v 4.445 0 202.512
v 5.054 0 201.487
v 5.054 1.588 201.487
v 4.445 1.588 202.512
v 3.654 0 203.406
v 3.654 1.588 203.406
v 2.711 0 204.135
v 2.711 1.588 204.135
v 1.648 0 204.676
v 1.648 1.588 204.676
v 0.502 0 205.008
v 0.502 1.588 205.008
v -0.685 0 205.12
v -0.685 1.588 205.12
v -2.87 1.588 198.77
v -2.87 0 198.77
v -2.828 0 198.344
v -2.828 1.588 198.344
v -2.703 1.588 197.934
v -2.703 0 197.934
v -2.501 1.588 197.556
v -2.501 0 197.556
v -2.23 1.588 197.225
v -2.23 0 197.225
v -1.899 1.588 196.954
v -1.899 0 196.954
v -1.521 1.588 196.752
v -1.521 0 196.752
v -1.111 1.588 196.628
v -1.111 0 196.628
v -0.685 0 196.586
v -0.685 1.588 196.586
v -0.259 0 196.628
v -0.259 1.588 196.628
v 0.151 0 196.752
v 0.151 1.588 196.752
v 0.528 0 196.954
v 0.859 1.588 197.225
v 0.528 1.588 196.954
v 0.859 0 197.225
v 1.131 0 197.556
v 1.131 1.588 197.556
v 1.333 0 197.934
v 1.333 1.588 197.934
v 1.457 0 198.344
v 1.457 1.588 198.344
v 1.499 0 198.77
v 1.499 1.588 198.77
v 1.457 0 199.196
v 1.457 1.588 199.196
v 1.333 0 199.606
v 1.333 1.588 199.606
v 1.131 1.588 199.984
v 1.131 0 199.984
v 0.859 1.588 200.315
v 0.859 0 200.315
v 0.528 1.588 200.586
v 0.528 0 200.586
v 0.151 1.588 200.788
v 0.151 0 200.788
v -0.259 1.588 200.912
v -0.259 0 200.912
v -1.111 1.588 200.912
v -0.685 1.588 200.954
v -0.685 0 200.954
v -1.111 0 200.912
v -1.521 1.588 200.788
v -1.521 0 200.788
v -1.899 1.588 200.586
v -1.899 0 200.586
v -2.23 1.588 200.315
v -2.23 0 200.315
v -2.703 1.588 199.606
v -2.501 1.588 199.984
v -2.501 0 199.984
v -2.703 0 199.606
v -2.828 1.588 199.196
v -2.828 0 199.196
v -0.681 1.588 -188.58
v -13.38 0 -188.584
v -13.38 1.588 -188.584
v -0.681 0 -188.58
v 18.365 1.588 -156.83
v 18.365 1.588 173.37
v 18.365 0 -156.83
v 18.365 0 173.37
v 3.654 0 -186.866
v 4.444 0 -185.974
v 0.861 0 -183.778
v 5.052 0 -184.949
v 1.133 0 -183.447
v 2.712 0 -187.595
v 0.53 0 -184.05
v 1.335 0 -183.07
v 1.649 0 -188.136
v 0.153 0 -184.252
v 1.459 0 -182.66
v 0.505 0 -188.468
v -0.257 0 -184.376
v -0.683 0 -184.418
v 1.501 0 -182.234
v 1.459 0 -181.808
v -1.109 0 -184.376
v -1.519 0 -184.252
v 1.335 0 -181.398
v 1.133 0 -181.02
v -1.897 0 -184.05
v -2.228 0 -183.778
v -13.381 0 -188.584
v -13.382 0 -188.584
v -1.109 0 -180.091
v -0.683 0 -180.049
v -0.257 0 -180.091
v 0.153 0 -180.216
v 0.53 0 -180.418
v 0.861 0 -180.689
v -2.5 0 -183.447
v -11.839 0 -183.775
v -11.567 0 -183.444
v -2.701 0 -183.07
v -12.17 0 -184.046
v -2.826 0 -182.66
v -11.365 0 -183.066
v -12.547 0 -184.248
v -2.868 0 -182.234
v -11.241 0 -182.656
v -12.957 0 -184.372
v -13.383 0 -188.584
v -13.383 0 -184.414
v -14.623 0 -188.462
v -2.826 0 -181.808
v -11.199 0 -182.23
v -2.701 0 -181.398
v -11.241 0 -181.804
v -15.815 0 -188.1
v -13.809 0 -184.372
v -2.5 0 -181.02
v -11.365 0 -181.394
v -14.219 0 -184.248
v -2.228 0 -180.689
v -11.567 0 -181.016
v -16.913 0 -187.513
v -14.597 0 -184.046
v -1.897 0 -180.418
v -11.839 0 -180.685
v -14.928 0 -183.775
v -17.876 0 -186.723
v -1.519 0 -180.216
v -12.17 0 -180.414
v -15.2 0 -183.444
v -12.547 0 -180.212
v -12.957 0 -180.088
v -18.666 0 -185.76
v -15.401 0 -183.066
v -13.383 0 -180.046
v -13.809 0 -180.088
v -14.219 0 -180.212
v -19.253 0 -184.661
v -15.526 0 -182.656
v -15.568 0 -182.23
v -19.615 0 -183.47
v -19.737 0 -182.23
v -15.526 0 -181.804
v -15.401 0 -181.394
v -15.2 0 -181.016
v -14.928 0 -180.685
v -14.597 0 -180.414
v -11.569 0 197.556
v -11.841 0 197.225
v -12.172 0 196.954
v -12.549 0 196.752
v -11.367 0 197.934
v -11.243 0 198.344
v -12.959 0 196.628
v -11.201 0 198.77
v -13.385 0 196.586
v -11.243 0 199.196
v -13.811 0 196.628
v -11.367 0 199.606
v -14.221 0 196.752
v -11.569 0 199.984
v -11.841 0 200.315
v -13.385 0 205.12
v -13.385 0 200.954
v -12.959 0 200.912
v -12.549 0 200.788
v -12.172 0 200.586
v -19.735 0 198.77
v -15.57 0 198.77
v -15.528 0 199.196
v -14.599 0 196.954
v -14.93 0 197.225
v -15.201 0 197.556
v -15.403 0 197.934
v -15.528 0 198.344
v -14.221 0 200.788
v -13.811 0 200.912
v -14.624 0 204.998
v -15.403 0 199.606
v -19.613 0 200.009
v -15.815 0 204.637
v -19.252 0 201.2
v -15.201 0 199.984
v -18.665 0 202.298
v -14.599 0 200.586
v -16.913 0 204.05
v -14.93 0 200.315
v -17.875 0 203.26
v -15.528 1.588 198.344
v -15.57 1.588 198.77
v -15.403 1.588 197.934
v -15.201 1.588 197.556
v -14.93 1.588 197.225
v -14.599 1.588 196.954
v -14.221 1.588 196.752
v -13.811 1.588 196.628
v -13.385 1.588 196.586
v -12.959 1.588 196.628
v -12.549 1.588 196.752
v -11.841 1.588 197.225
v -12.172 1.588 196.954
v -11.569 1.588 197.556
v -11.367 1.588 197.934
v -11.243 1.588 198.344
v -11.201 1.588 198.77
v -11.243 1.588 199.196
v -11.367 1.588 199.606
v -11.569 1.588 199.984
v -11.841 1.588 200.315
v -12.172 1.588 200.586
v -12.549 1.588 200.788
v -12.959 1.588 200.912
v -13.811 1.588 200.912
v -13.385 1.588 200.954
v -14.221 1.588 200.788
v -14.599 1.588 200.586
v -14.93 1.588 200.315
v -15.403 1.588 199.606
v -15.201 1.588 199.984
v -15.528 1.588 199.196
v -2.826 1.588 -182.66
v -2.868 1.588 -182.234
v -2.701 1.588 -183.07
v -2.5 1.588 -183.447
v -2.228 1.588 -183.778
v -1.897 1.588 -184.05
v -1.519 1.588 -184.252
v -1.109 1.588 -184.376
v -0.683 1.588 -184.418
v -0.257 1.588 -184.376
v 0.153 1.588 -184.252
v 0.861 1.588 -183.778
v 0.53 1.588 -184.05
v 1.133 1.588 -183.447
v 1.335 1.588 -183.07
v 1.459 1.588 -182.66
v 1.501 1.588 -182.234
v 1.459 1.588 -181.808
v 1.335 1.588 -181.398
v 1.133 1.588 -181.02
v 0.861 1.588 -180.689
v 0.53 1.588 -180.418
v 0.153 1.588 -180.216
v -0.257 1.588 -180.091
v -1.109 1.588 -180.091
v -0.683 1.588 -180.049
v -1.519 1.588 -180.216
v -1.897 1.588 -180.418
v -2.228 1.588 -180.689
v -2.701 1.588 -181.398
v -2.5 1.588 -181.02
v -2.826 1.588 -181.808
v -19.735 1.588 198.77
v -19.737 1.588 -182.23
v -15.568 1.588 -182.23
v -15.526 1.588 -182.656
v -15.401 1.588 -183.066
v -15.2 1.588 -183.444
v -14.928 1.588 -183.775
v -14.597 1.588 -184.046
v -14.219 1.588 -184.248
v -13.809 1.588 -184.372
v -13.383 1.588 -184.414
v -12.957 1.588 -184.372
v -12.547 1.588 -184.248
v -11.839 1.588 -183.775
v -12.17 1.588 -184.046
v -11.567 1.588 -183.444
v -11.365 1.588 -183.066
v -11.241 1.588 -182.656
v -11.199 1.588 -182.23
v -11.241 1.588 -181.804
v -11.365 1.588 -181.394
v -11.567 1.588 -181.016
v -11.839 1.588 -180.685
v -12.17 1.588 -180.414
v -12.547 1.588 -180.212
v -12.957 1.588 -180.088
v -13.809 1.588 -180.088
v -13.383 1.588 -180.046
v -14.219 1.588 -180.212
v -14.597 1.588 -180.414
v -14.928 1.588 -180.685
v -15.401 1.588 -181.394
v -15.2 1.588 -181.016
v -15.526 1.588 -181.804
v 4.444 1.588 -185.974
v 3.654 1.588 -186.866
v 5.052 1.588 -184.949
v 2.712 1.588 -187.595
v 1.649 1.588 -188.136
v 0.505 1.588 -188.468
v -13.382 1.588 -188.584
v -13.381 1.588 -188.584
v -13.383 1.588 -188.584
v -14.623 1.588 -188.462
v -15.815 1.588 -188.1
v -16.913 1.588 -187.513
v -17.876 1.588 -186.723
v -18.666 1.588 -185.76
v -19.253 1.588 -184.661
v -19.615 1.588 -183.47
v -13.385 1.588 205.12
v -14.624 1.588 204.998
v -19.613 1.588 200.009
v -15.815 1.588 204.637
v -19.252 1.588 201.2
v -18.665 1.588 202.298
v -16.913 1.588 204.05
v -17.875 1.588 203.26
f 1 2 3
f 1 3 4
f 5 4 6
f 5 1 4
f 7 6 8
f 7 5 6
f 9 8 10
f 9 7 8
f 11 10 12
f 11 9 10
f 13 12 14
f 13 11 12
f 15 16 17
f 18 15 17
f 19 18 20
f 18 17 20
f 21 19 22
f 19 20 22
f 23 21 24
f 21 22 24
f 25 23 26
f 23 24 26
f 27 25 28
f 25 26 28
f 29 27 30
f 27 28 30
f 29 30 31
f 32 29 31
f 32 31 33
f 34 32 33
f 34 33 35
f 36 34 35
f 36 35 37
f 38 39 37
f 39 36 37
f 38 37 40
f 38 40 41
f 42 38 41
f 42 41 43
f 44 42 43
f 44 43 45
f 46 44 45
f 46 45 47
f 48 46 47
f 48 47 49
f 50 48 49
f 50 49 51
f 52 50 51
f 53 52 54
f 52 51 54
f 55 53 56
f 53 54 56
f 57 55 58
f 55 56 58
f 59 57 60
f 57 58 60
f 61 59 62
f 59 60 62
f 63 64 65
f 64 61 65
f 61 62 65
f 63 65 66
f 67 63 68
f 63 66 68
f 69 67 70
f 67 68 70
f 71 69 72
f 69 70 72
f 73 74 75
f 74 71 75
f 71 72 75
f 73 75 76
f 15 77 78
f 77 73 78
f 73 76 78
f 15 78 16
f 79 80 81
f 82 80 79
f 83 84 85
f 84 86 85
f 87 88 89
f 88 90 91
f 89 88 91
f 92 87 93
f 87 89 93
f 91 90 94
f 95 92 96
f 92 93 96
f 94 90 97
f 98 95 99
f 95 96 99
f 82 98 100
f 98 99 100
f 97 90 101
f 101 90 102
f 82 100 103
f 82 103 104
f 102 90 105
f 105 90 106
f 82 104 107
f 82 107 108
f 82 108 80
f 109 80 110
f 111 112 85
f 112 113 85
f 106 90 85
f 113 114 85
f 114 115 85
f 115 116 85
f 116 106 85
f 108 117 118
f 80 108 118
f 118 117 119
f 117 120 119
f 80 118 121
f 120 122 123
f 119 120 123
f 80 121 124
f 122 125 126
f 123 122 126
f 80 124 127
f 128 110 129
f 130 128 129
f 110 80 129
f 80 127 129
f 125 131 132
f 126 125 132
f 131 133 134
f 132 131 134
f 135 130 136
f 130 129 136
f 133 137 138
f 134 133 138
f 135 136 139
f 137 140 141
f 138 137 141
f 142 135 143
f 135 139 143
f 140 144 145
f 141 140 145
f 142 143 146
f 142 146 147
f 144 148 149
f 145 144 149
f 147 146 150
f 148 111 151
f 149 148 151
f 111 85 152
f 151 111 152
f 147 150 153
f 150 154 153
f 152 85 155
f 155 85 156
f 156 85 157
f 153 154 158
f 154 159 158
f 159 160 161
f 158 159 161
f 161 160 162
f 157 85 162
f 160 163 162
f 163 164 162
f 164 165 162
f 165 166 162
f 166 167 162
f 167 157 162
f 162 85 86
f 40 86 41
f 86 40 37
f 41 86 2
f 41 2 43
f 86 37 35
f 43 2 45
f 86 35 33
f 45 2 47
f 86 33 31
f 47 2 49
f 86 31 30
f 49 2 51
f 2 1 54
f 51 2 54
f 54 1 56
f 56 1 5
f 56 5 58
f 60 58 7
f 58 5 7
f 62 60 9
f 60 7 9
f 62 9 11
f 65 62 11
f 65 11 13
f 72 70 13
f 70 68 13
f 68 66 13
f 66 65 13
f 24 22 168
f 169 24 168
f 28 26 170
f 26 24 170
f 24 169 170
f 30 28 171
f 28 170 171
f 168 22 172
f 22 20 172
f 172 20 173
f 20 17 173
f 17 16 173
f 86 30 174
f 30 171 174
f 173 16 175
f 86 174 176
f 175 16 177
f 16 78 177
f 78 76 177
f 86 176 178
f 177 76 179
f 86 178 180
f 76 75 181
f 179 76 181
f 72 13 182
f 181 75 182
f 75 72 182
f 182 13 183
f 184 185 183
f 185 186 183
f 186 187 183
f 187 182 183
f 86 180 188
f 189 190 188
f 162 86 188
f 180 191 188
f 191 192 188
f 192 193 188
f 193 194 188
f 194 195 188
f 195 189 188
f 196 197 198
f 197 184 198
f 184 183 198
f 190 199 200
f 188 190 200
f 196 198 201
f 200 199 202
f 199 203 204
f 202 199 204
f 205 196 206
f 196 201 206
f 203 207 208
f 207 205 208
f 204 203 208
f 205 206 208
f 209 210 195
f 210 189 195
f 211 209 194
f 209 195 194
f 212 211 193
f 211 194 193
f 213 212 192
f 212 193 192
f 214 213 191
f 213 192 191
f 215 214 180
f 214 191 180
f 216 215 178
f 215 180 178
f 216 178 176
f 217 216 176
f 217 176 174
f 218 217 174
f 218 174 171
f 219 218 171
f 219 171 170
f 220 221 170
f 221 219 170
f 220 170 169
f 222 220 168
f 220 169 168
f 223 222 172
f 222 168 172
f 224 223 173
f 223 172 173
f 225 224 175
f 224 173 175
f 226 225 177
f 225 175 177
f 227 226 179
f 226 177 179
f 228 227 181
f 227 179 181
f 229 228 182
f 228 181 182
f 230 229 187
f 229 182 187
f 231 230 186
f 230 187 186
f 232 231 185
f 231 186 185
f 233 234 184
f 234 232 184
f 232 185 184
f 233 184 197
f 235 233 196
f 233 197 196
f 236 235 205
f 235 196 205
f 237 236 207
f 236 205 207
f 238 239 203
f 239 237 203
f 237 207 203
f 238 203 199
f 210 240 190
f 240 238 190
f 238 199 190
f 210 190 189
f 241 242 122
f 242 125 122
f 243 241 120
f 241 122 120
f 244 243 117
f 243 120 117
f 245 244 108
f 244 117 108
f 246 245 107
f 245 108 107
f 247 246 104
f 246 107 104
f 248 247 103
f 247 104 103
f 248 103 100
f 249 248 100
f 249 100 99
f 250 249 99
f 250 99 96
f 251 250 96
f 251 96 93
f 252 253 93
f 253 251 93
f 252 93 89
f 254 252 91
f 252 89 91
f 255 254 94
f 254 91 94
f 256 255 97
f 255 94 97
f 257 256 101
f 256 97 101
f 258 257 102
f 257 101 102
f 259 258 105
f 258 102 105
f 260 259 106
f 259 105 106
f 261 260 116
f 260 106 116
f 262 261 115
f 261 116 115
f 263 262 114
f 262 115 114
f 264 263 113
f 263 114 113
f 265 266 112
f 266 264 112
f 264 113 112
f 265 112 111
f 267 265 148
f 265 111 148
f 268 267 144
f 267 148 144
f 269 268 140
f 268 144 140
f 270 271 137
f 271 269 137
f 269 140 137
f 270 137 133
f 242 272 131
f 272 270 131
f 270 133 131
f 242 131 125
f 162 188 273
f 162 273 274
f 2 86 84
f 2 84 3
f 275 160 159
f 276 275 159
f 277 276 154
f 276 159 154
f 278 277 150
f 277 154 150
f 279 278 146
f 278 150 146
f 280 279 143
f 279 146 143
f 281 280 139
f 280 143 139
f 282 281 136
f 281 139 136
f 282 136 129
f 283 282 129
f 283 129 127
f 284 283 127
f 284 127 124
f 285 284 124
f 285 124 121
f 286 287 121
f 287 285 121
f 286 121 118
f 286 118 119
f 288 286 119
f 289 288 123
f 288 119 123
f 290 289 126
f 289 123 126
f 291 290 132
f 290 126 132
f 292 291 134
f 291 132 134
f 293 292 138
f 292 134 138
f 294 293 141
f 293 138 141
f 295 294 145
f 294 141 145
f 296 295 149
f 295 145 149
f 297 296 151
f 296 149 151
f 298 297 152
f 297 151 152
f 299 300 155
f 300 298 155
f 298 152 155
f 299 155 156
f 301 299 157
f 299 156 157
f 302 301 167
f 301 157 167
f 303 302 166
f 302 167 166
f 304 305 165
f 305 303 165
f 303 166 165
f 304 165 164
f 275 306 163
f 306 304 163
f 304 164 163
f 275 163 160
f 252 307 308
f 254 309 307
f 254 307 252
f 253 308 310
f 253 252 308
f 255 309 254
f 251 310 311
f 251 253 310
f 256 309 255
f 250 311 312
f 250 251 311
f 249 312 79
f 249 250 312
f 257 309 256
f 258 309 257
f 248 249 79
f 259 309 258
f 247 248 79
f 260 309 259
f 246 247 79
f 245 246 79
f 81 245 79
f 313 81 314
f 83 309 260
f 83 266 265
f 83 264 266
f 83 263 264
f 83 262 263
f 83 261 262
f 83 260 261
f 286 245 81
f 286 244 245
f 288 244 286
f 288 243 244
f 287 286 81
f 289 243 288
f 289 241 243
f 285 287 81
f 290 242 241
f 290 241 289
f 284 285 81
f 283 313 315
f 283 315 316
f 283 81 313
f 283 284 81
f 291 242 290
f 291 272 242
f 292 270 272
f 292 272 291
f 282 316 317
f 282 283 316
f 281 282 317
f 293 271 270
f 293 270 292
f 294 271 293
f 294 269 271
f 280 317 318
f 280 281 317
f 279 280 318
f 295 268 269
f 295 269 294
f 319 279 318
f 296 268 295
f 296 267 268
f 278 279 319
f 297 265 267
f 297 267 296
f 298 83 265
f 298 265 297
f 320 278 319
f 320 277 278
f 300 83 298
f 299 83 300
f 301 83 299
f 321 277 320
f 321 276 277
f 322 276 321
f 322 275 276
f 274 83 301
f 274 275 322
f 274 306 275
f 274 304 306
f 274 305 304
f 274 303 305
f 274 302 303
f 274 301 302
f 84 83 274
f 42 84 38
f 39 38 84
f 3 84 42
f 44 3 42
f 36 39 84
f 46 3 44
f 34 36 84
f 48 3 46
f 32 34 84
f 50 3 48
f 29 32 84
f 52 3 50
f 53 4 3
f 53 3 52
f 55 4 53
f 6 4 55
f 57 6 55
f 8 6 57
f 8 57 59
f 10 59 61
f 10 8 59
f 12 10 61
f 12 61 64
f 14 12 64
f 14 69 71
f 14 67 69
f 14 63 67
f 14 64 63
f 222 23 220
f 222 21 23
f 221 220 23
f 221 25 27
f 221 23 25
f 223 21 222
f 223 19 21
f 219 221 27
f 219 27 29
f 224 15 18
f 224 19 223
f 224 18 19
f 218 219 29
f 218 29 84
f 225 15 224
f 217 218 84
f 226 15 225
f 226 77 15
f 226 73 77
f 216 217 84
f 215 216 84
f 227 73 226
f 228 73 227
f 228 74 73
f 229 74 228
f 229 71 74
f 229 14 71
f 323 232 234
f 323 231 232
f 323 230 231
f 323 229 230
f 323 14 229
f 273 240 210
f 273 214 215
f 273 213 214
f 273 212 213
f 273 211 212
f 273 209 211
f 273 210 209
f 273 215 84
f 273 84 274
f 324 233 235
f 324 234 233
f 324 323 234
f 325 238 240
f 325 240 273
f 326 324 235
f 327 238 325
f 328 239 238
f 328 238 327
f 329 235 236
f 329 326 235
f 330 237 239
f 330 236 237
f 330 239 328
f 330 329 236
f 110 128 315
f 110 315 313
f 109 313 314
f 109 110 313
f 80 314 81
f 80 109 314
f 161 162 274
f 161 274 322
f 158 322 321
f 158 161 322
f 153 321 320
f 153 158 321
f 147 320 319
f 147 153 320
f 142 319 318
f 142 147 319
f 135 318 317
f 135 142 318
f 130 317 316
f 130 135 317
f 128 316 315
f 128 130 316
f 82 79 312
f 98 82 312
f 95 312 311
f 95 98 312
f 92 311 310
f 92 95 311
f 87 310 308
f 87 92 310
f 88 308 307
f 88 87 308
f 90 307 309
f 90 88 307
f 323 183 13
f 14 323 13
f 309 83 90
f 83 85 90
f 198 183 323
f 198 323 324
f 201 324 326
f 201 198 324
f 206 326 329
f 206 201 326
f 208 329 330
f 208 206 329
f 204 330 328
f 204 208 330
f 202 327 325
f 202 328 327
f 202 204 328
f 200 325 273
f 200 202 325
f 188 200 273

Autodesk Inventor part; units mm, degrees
ref_plane "YZ Plane" through (0, 0, 0) normal (1, 0, 0) x (0, 1, 0)
ref_plane "XZ Plane" through (0, 0, 0) normal (0, 1, 0) x (-1, 0, 0)
ref_plane "XY Plane" through (0, 0, 0) normal (0, 0, 1) x (1, 0, 0)
sketch "Sketch1" plane through (0, 0, 0) normal (0, 1, 0) x (-1, 0, 0)
  circle A0 centre (0.6852, 198.77) radius 2.1844
  circle A1 centre (13.3852, 198.77) radius 2.1844
  circle A2 centre (13.3833, -182.23) radius 2.1844
  circle A3 centre (0.6833, -182.2338) radius 2.1844
  arc A4 (19.7352, 198.77) -> (13.3852, 205.12) centre (13.3852, 198.77) ccw
  arc A5 (0.6852, 205.12) -> (-5.0541, 201.487) centre (0.6852, 198.77) ccw
  arc A6 (13.3795, -188.5838) -> (19.7372, -182.23) centre (13.3833, -182.23) ccw
  arc A7 (-5.0525, -184.9492) -> (0.6814, -188.5799) centre (0.6833, -182.2338) ccw
  line L0 (13.3852, 205.12) -> (0.6852, 205.12)
  line L1 (13.3833, -188.5838) -> (0.6814, -188.5799)
  line L2 (19.7352, 198.77) -> (19.7372, -182.23)
  line L3 (-18.3648, 173.37) -> (-18.3648, -156.83)
  line L4 (-18.3648, -156.83) -> (-5.0525, -184.9492)
  line L5 (-18.3648, 173.37) -> (-5.0541, 201.487)
  point P0 (0, 0)
  dimension "d0" = 330.2
extrude "Extrusion1" add sketch "Sketch1" along normal blind 1.5875
properties part number "skirt" material "Acetal Resin, White"
